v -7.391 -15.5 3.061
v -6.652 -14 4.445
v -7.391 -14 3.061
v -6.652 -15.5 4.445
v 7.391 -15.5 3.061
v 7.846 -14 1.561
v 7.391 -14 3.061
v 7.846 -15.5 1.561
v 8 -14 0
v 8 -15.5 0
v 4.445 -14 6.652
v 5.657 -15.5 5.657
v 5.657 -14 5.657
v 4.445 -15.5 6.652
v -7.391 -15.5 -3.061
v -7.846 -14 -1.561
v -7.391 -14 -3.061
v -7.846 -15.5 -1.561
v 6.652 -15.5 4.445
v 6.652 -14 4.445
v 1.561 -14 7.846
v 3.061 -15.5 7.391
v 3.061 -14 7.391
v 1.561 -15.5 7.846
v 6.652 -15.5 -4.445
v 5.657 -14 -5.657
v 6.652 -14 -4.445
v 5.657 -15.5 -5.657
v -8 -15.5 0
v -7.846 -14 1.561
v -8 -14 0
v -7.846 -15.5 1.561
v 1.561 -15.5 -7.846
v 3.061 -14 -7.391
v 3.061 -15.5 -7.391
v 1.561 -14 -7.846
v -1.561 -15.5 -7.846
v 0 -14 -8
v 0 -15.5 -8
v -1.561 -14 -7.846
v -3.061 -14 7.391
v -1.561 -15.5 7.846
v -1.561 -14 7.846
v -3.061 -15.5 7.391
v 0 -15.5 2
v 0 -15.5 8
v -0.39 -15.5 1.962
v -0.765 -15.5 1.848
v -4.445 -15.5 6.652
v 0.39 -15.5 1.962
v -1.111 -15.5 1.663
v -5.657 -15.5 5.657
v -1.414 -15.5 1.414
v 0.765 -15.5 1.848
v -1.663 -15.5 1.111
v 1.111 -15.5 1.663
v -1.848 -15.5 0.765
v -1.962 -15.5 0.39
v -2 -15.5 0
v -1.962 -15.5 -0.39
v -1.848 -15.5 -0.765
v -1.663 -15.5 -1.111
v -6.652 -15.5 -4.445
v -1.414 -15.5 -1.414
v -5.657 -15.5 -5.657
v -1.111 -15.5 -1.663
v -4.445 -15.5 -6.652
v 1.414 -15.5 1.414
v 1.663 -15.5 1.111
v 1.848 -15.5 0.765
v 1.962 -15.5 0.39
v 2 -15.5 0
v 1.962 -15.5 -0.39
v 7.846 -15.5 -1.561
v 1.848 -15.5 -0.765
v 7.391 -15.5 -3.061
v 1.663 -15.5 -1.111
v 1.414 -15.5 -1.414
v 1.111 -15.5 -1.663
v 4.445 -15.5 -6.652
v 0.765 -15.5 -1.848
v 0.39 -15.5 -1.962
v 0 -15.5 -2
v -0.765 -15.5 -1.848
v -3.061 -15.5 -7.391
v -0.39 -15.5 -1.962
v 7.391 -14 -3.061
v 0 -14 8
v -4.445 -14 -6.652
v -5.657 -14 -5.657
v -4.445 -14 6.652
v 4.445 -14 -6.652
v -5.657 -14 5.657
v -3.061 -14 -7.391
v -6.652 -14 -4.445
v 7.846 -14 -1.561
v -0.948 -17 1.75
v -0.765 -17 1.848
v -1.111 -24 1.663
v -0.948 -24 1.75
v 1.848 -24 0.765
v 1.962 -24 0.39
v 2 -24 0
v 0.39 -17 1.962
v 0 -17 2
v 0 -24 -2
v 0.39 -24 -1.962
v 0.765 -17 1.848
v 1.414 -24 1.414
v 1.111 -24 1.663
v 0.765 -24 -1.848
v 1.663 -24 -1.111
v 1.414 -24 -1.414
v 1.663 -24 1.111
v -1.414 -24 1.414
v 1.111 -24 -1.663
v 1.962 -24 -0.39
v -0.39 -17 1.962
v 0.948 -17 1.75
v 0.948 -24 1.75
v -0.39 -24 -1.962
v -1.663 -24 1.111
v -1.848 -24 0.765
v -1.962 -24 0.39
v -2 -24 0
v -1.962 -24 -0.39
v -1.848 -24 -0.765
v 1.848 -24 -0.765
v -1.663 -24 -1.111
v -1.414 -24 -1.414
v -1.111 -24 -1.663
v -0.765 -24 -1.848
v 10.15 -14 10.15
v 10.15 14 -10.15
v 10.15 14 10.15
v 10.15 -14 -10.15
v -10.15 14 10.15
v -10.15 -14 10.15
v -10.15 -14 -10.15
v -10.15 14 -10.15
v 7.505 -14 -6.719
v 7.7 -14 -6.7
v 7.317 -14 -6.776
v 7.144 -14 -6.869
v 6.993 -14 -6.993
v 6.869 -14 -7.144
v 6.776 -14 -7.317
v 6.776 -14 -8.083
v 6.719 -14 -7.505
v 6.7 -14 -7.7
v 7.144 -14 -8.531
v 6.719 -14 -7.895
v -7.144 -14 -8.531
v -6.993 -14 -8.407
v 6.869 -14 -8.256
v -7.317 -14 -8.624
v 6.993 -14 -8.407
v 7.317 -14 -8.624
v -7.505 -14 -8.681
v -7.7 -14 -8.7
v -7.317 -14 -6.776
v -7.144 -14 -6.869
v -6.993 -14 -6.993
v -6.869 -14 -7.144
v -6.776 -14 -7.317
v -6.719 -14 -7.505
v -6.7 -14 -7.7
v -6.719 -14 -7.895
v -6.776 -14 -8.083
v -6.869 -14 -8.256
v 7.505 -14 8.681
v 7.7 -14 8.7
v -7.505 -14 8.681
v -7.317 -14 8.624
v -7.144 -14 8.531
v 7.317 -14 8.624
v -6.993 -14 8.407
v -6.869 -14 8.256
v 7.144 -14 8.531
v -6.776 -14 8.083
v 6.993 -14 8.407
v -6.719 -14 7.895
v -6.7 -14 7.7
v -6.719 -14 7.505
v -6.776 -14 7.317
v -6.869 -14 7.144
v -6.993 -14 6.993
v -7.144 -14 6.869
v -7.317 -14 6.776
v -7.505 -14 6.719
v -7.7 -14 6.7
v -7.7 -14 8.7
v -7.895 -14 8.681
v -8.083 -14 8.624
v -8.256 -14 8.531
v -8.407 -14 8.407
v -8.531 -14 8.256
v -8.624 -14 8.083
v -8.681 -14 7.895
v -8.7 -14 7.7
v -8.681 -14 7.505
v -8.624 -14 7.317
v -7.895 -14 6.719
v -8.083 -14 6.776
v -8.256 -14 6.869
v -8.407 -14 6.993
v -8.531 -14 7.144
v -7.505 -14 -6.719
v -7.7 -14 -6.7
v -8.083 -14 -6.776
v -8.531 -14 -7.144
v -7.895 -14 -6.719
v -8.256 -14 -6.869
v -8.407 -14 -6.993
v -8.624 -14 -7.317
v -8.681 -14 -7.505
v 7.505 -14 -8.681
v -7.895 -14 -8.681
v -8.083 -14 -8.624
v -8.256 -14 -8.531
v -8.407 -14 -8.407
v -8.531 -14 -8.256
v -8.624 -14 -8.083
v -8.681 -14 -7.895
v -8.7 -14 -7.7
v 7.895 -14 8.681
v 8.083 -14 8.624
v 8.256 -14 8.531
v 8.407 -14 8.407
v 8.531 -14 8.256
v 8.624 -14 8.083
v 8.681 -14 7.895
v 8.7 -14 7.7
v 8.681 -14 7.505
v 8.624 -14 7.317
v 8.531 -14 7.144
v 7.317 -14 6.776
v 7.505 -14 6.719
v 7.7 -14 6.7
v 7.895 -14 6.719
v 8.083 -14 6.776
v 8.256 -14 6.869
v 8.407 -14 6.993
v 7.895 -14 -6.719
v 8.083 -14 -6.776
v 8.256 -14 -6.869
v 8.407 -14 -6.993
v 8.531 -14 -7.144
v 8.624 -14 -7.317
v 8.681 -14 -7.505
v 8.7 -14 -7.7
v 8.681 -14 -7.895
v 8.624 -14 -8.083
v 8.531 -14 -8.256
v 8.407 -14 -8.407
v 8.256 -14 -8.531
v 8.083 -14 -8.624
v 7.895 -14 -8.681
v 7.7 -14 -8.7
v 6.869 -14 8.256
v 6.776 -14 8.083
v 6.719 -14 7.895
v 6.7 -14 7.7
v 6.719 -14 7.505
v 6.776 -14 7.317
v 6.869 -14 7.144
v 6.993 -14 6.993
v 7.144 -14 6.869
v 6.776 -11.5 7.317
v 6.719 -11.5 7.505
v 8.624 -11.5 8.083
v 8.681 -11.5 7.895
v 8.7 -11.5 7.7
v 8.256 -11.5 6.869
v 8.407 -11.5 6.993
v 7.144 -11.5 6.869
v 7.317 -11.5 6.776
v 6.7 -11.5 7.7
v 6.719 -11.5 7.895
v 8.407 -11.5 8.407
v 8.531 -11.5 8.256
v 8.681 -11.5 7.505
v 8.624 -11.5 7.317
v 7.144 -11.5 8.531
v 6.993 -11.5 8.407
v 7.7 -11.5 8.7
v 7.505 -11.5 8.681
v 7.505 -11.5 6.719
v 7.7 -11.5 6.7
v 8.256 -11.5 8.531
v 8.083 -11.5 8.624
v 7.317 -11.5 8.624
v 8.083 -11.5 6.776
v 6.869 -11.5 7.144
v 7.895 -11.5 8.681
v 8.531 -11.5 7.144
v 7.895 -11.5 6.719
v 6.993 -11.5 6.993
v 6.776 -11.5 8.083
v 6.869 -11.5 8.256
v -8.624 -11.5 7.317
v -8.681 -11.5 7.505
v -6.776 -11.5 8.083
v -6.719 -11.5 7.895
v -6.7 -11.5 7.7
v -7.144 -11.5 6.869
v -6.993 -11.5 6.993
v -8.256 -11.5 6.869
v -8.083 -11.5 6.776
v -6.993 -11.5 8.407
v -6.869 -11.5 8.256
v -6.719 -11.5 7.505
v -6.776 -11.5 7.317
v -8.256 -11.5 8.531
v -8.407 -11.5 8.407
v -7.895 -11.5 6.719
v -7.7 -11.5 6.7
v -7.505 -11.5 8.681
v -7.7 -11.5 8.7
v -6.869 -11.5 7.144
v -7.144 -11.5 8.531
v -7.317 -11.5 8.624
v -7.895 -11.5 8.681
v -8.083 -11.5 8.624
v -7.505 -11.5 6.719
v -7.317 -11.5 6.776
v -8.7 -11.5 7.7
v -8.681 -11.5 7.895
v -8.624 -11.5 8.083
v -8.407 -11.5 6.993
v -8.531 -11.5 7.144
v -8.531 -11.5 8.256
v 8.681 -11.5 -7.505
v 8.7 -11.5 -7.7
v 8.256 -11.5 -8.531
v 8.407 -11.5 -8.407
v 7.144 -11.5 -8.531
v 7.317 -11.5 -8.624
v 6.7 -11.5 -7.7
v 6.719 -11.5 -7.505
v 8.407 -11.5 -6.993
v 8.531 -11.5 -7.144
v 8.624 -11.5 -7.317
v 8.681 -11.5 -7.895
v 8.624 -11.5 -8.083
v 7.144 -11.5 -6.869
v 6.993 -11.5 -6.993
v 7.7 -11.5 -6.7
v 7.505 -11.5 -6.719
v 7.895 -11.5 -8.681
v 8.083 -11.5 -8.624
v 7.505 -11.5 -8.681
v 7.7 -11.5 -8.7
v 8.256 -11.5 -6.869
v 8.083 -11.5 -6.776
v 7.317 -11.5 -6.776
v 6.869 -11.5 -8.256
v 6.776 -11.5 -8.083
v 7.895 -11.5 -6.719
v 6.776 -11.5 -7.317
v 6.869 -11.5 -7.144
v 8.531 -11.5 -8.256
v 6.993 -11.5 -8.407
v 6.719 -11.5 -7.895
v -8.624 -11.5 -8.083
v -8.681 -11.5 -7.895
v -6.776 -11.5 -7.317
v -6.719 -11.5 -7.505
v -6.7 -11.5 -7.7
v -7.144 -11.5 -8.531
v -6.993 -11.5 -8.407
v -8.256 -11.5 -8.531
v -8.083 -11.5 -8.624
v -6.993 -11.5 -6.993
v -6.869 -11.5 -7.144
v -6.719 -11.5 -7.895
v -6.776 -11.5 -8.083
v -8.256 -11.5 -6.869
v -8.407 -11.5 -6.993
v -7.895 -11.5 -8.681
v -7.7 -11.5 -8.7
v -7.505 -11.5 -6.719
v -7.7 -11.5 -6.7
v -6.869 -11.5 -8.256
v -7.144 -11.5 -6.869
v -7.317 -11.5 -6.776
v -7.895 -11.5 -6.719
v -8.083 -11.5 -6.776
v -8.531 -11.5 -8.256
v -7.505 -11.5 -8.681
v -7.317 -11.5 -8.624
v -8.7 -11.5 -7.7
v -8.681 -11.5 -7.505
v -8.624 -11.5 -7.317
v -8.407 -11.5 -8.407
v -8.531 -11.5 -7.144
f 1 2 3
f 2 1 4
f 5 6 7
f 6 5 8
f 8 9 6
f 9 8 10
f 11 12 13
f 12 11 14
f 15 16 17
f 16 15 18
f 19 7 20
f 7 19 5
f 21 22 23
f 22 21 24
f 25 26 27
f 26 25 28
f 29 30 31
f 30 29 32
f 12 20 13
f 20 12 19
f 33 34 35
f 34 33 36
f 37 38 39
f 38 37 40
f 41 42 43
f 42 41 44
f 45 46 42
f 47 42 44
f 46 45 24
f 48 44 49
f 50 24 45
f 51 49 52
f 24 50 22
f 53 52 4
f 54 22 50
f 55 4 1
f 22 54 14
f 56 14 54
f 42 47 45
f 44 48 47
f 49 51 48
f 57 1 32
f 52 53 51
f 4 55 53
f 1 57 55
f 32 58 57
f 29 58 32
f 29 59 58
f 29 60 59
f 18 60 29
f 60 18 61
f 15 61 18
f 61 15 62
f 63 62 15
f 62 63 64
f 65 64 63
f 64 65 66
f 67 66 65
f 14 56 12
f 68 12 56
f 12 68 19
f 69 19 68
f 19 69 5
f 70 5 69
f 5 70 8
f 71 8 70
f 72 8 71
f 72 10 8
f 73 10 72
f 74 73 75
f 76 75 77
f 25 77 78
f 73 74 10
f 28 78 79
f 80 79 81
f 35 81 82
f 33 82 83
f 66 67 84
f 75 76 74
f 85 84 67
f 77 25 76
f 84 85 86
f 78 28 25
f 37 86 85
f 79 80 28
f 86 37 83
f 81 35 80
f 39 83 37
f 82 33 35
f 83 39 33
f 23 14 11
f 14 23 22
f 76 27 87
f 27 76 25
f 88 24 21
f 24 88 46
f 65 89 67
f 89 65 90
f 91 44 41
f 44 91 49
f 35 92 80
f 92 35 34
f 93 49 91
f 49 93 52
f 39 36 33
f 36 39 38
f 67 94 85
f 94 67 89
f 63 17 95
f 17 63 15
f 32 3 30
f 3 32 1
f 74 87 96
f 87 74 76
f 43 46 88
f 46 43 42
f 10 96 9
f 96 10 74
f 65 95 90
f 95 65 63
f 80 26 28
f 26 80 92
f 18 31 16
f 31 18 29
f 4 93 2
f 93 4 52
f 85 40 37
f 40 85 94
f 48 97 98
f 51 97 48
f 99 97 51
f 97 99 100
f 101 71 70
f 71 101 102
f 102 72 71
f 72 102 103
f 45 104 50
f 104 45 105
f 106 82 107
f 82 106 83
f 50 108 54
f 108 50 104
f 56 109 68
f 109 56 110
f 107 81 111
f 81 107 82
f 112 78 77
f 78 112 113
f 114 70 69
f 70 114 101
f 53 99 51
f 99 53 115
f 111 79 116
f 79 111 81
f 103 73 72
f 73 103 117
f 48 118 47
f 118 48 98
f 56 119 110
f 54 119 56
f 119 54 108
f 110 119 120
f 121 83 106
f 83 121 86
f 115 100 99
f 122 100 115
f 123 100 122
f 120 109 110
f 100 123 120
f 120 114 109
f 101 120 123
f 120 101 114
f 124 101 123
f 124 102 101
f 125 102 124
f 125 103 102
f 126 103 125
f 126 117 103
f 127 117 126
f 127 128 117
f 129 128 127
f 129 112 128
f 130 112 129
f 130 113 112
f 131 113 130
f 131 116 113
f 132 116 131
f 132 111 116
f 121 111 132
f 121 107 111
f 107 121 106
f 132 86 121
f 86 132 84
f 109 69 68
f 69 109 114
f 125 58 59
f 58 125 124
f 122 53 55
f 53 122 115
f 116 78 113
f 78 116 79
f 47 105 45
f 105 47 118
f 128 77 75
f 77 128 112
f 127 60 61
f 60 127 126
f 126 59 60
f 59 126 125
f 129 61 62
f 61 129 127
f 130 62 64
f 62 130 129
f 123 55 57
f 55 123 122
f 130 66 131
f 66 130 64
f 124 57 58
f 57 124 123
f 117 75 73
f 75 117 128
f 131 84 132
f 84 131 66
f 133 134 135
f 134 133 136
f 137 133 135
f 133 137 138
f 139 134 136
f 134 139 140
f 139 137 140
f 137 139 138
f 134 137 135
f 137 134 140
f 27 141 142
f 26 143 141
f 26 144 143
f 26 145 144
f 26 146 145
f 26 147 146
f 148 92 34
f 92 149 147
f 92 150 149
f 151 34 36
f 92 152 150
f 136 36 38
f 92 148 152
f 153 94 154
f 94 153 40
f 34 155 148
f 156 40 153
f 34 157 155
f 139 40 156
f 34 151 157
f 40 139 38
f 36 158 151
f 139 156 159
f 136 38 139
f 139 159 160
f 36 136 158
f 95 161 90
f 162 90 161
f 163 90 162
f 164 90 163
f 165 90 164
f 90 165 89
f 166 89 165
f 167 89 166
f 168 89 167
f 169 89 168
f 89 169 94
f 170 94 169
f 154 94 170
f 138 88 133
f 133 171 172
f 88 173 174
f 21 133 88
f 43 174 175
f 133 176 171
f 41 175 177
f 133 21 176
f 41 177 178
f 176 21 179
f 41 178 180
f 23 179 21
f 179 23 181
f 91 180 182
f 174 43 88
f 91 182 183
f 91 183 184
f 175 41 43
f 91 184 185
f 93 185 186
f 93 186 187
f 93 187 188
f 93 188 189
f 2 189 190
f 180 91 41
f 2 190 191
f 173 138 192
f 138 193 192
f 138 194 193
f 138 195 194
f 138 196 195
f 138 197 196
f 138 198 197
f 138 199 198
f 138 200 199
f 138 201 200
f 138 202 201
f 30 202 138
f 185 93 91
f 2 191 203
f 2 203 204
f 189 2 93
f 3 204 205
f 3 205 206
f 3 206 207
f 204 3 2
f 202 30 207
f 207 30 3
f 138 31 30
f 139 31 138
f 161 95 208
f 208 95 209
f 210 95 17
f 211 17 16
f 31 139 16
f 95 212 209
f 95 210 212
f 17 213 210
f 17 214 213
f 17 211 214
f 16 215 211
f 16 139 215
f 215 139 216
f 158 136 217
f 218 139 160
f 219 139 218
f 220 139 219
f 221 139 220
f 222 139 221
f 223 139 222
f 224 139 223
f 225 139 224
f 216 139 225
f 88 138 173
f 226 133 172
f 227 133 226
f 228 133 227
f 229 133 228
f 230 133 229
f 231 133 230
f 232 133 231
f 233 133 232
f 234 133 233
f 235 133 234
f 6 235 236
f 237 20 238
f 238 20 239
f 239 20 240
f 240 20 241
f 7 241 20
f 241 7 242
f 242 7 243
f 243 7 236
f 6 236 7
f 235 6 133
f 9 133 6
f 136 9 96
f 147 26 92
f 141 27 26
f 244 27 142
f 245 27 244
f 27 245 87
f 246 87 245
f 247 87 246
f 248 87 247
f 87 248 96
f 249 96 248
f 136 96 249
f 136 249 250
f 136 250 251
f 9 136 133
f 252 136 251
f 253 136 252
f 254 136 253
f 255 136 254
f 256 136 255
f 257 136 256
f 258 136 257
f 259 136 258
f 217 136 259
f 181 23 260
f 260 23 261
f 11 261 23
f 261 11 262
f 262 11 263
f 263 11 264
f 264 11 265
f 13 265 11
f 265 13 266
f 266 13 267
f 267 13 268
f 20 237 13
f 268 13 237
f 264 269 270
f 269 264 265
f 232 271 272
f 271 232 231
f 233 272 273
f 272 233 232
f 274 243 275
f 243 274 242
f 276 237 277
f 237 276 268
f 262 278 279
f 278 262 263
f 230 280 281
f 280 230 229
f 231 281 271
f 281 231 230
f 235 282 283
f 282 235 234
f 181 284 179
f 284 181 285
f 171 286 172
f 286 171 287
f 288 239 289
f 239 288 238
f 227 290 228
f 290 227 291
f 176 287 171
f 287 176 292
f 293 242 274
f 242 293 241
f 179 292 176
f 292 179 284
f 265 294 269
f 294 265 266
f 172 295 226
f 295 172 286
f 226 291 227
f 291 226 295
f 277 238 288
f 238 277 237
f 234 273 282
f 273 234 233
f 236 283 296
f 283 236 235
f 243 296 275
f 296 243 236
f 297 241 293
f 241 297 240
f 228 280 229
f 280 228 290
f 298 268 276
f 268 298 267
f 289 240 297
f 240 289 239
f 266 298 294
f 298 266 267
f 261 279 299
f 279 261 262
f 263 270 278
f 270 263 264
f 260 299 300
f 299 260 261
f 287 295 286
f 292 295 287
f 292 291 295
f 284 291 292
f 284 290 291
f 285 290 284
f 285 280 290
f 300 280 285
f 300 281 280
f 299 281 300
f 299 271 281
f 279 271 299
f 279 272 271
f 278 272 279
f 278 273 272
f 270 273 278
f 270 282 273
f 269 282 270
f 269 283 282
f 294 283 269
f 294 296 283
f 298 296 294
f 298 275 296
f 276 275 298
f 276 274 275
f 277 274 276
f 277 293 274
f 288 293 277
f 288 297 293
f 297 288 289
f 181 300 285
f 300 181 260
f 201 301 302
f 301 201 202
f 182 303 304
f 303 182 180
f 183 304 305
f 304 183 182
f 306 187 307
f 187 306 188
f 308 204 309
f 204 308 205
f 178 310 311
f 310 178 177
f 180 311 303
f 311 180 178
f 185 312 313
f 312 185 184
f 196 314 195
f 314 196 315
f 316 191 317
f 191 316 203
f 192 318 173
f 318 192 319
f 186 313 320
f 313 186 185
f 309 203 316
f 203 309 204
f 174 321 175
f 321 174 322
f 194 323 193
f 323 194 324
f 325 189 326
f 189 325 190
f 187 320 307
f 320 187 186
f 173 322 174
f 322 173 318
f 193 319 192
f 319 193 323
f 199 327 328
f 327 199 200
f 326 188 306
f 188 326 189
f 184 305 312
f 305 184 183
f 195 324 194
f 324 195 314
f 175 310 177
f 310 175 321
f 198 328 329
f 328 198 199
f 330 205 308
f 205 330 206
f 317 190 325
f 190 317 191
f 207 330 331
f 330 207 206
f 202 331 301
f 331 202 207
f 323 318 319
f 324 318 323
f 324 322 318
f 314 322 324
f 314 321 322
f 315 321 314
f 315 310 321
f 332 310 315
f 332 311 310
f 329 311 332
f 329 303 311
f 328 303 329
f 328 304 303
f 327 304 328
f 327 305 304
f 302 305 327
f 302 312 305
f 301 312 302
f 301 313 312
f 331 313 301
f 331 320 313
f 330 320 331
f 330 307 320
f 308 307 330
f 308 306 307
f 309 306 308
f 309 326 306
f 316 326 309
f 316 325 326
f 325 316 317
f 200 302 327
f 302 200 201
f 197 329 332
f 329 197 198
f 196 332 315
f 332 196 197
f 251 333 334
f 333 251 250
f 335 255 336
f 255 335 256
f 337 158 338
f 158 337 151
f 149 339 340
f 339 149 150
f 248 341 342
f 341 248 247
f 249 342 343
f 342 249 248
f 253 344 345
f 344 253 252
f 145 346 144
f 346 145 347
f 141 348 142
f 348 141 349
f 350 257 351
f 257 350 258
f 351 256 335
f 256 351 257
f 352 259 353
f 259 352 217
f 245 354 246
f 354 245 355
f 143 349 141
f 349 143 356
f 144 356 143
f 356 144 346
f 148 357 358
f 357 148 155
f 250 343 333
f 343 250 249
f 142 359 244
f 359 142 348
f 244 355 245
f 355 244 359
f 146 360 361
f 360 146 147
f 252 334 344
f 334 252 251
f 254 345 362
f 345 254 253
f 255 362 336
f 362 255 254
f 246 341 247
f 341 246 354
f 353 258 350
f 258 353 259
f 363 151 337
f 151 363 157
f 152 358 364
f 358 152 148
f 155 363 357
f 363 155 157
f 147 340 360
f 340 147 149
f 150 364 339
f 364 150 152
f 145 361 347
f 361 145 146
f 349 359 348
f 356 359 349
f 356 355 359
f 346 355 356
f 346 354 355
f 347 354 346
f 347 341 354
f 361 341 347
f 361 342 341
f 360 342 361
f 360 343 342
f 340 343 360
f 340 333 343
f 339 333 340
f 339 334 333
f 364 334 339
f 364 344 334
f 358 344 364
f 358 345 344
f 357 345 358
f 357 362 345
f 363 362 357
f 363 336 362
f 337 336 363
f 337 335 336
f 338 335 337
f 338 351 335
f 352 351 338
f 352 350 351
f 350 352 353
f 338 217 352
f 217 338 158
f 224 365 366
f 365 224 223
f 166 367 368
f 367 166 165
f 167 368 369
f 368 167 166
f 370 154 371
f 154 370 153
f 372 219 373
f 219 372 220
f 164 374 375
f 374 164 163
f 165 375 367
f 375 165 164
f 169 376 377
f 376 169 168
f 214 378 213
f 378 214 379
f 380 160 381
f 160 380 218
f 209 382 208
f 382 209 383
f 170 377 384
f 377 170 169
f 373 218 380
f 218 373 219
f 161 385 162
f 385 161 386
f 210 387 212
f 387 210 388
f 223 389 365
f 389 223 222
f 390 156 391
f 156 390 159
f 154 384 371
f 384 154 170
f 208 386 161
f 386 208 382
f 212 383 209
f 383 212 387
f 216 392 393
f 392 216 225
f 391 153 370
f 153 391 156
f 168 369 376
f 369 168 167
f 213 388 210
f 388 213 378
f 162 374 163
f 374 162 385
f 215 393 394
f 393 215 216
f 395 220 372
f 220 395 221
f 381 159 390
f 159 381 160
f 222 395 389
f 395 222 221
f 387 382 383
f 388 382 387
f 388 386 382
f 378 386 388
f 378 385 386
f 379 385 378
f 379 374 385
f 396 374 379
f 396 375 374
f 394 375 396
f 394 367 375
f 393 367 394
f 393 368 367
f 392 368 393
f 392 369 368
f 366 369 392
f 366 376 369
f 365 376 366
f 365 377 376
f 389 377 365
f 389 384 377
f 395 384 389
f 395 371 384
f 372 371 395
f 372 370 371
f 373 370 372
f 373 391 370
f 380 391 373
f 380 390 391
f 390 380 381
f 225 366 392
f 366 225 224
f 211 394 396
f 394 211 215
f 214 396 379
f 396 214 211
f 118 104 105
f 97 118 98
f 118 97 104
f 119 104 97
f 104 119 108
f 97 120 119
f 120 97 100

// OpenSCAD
// WeePrusa
// Stepper Motors
// GNU GPL v3
// Thomas Phillips (tntexplosivesltd@gmail.com)
// https://github.com/tntexplosivesltd/WeePrusa

$fn = 32;

// Colours
black = [12/255, 12/255, 12/255];
grey = [200/255, 200/255, 200/255];

// Motor back
width = 20.3;
torque = 1.6;

// Shaft
shaft = 10;
shaft_radius = 2;
keyway = 7;
hub_radius = 8;
hub_width = 1.5;

// Screws
screw_size = 2;
screw_depth = 2.5;
screw_separation = 15.4;

function get_length(t) = lookup(t, [
			[1.6, 28],
			[1.8, 30],
			[2, 33],
			[3, 38],
			[4, 38],
	]);

length = get_length(torque);

difference()
{
	union()
	{
		color (black) cube ([width, length, width], center = true);
		color (grey)
		{
			translate ([0, -length/2, 0]) rotate ([90,0,0]) cylinder (h = hub_width*2, r1 = hub_radius, r2 = hub_radius, center = true);
			translate ([0, -length/2, 0]) rotate ([90,0,0]) cylinder (h = shaft*2, r1 = shaft_radius, r2 = shaft_radius, center = true);
		}
	}
	
	color (grey)
	{
		// screw holes
		translate ([screw_separation/2, -length/2, screw_separation/2]) rotate ([90,0,0]) cylinder (h = screw_depth*2, r1 = screw_size/2, r2 = screw_size/2, center = true);
		translate ([-screw_separation/2, -length/2, screw_separation/2]) rotate ([90,0,0]) cylinder (h = screw_depth*2, r1 = screw_size/2, r2 = screw_size/2, center = true);
		translate ([screw_separation/2, -length/2, -screw_separation/2]) rotate ([90,0,0]) cylinder (h = screw_depth*2, r1 = screw_size/2, r2 = screw_size/2, center = true);
		translate ([-screw_separation/2, -length/2, -screw_separation/2]) rotate ([90,0,0]) cylinder (h = screw_depth*2, r1 = screw_size/2, r2 = screw_size/2, center = true);

		// flat on shaft
		translate ([0, -length/2 - shaft, shaft_radius]) rotate ([90,0,0]) cube ([5, 0.5, keyway*2], center = true);
	}
}
